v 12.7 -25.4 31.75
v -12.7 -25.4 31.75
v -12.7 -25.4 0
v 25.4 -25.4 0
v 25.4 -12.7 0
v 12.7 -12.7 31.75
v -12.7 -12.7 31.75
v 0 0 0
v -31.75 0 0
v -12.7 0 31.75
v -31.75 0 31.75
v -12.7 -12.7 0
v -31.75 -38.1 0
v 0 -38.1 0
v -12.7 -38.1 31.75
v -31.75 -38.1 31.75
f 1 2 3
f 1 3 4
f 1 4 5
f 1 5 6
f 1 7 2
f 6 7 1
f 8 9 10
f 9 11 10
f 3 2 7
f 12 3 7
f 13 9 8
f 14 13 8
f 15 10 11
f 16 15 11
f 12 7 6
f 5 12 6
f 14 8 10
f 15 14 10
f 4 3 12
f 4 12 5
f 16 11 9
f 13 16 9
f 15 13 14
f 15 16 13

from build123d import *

# Parameters (mm, degrees)
F1_DEPTH = 38.1
F2_W     = 25.4
F2_H     = 12.7
F3_DEPTH = 31.75
F5_DEPTH = 12.7


with BuildPart() as f1:
    # F0 (on Front) → F1 (new body)
    with BuildSketch(Plane.XZ):
        Polygon((-31.75, 0), (0, 0), (-12.7, 31.75), (-31.75, 31.75), align=None)
    extrude(amount=F1_DEPTH)


with BuildPart() as f3:
    # F2 (on face) → F3 (new body)
    with BuildSketch(Plane.XY.offset(31.75)):
        with Locations((0, -19.05)):
            Rectangle(F2_W, F2_H)
    extrude(amount=-F3_DEPTH)

    # F4 (on face) → F5 (join)
    with BuildSketch(Plane.XZ.offset(25.4)):
        Polygon((25.4, 0), (12.7, 31.75), (12.7, 0), align=None)
    extrude(amount=-F5_DEPTH)


solid = Compound([f1.part, f3.part])
